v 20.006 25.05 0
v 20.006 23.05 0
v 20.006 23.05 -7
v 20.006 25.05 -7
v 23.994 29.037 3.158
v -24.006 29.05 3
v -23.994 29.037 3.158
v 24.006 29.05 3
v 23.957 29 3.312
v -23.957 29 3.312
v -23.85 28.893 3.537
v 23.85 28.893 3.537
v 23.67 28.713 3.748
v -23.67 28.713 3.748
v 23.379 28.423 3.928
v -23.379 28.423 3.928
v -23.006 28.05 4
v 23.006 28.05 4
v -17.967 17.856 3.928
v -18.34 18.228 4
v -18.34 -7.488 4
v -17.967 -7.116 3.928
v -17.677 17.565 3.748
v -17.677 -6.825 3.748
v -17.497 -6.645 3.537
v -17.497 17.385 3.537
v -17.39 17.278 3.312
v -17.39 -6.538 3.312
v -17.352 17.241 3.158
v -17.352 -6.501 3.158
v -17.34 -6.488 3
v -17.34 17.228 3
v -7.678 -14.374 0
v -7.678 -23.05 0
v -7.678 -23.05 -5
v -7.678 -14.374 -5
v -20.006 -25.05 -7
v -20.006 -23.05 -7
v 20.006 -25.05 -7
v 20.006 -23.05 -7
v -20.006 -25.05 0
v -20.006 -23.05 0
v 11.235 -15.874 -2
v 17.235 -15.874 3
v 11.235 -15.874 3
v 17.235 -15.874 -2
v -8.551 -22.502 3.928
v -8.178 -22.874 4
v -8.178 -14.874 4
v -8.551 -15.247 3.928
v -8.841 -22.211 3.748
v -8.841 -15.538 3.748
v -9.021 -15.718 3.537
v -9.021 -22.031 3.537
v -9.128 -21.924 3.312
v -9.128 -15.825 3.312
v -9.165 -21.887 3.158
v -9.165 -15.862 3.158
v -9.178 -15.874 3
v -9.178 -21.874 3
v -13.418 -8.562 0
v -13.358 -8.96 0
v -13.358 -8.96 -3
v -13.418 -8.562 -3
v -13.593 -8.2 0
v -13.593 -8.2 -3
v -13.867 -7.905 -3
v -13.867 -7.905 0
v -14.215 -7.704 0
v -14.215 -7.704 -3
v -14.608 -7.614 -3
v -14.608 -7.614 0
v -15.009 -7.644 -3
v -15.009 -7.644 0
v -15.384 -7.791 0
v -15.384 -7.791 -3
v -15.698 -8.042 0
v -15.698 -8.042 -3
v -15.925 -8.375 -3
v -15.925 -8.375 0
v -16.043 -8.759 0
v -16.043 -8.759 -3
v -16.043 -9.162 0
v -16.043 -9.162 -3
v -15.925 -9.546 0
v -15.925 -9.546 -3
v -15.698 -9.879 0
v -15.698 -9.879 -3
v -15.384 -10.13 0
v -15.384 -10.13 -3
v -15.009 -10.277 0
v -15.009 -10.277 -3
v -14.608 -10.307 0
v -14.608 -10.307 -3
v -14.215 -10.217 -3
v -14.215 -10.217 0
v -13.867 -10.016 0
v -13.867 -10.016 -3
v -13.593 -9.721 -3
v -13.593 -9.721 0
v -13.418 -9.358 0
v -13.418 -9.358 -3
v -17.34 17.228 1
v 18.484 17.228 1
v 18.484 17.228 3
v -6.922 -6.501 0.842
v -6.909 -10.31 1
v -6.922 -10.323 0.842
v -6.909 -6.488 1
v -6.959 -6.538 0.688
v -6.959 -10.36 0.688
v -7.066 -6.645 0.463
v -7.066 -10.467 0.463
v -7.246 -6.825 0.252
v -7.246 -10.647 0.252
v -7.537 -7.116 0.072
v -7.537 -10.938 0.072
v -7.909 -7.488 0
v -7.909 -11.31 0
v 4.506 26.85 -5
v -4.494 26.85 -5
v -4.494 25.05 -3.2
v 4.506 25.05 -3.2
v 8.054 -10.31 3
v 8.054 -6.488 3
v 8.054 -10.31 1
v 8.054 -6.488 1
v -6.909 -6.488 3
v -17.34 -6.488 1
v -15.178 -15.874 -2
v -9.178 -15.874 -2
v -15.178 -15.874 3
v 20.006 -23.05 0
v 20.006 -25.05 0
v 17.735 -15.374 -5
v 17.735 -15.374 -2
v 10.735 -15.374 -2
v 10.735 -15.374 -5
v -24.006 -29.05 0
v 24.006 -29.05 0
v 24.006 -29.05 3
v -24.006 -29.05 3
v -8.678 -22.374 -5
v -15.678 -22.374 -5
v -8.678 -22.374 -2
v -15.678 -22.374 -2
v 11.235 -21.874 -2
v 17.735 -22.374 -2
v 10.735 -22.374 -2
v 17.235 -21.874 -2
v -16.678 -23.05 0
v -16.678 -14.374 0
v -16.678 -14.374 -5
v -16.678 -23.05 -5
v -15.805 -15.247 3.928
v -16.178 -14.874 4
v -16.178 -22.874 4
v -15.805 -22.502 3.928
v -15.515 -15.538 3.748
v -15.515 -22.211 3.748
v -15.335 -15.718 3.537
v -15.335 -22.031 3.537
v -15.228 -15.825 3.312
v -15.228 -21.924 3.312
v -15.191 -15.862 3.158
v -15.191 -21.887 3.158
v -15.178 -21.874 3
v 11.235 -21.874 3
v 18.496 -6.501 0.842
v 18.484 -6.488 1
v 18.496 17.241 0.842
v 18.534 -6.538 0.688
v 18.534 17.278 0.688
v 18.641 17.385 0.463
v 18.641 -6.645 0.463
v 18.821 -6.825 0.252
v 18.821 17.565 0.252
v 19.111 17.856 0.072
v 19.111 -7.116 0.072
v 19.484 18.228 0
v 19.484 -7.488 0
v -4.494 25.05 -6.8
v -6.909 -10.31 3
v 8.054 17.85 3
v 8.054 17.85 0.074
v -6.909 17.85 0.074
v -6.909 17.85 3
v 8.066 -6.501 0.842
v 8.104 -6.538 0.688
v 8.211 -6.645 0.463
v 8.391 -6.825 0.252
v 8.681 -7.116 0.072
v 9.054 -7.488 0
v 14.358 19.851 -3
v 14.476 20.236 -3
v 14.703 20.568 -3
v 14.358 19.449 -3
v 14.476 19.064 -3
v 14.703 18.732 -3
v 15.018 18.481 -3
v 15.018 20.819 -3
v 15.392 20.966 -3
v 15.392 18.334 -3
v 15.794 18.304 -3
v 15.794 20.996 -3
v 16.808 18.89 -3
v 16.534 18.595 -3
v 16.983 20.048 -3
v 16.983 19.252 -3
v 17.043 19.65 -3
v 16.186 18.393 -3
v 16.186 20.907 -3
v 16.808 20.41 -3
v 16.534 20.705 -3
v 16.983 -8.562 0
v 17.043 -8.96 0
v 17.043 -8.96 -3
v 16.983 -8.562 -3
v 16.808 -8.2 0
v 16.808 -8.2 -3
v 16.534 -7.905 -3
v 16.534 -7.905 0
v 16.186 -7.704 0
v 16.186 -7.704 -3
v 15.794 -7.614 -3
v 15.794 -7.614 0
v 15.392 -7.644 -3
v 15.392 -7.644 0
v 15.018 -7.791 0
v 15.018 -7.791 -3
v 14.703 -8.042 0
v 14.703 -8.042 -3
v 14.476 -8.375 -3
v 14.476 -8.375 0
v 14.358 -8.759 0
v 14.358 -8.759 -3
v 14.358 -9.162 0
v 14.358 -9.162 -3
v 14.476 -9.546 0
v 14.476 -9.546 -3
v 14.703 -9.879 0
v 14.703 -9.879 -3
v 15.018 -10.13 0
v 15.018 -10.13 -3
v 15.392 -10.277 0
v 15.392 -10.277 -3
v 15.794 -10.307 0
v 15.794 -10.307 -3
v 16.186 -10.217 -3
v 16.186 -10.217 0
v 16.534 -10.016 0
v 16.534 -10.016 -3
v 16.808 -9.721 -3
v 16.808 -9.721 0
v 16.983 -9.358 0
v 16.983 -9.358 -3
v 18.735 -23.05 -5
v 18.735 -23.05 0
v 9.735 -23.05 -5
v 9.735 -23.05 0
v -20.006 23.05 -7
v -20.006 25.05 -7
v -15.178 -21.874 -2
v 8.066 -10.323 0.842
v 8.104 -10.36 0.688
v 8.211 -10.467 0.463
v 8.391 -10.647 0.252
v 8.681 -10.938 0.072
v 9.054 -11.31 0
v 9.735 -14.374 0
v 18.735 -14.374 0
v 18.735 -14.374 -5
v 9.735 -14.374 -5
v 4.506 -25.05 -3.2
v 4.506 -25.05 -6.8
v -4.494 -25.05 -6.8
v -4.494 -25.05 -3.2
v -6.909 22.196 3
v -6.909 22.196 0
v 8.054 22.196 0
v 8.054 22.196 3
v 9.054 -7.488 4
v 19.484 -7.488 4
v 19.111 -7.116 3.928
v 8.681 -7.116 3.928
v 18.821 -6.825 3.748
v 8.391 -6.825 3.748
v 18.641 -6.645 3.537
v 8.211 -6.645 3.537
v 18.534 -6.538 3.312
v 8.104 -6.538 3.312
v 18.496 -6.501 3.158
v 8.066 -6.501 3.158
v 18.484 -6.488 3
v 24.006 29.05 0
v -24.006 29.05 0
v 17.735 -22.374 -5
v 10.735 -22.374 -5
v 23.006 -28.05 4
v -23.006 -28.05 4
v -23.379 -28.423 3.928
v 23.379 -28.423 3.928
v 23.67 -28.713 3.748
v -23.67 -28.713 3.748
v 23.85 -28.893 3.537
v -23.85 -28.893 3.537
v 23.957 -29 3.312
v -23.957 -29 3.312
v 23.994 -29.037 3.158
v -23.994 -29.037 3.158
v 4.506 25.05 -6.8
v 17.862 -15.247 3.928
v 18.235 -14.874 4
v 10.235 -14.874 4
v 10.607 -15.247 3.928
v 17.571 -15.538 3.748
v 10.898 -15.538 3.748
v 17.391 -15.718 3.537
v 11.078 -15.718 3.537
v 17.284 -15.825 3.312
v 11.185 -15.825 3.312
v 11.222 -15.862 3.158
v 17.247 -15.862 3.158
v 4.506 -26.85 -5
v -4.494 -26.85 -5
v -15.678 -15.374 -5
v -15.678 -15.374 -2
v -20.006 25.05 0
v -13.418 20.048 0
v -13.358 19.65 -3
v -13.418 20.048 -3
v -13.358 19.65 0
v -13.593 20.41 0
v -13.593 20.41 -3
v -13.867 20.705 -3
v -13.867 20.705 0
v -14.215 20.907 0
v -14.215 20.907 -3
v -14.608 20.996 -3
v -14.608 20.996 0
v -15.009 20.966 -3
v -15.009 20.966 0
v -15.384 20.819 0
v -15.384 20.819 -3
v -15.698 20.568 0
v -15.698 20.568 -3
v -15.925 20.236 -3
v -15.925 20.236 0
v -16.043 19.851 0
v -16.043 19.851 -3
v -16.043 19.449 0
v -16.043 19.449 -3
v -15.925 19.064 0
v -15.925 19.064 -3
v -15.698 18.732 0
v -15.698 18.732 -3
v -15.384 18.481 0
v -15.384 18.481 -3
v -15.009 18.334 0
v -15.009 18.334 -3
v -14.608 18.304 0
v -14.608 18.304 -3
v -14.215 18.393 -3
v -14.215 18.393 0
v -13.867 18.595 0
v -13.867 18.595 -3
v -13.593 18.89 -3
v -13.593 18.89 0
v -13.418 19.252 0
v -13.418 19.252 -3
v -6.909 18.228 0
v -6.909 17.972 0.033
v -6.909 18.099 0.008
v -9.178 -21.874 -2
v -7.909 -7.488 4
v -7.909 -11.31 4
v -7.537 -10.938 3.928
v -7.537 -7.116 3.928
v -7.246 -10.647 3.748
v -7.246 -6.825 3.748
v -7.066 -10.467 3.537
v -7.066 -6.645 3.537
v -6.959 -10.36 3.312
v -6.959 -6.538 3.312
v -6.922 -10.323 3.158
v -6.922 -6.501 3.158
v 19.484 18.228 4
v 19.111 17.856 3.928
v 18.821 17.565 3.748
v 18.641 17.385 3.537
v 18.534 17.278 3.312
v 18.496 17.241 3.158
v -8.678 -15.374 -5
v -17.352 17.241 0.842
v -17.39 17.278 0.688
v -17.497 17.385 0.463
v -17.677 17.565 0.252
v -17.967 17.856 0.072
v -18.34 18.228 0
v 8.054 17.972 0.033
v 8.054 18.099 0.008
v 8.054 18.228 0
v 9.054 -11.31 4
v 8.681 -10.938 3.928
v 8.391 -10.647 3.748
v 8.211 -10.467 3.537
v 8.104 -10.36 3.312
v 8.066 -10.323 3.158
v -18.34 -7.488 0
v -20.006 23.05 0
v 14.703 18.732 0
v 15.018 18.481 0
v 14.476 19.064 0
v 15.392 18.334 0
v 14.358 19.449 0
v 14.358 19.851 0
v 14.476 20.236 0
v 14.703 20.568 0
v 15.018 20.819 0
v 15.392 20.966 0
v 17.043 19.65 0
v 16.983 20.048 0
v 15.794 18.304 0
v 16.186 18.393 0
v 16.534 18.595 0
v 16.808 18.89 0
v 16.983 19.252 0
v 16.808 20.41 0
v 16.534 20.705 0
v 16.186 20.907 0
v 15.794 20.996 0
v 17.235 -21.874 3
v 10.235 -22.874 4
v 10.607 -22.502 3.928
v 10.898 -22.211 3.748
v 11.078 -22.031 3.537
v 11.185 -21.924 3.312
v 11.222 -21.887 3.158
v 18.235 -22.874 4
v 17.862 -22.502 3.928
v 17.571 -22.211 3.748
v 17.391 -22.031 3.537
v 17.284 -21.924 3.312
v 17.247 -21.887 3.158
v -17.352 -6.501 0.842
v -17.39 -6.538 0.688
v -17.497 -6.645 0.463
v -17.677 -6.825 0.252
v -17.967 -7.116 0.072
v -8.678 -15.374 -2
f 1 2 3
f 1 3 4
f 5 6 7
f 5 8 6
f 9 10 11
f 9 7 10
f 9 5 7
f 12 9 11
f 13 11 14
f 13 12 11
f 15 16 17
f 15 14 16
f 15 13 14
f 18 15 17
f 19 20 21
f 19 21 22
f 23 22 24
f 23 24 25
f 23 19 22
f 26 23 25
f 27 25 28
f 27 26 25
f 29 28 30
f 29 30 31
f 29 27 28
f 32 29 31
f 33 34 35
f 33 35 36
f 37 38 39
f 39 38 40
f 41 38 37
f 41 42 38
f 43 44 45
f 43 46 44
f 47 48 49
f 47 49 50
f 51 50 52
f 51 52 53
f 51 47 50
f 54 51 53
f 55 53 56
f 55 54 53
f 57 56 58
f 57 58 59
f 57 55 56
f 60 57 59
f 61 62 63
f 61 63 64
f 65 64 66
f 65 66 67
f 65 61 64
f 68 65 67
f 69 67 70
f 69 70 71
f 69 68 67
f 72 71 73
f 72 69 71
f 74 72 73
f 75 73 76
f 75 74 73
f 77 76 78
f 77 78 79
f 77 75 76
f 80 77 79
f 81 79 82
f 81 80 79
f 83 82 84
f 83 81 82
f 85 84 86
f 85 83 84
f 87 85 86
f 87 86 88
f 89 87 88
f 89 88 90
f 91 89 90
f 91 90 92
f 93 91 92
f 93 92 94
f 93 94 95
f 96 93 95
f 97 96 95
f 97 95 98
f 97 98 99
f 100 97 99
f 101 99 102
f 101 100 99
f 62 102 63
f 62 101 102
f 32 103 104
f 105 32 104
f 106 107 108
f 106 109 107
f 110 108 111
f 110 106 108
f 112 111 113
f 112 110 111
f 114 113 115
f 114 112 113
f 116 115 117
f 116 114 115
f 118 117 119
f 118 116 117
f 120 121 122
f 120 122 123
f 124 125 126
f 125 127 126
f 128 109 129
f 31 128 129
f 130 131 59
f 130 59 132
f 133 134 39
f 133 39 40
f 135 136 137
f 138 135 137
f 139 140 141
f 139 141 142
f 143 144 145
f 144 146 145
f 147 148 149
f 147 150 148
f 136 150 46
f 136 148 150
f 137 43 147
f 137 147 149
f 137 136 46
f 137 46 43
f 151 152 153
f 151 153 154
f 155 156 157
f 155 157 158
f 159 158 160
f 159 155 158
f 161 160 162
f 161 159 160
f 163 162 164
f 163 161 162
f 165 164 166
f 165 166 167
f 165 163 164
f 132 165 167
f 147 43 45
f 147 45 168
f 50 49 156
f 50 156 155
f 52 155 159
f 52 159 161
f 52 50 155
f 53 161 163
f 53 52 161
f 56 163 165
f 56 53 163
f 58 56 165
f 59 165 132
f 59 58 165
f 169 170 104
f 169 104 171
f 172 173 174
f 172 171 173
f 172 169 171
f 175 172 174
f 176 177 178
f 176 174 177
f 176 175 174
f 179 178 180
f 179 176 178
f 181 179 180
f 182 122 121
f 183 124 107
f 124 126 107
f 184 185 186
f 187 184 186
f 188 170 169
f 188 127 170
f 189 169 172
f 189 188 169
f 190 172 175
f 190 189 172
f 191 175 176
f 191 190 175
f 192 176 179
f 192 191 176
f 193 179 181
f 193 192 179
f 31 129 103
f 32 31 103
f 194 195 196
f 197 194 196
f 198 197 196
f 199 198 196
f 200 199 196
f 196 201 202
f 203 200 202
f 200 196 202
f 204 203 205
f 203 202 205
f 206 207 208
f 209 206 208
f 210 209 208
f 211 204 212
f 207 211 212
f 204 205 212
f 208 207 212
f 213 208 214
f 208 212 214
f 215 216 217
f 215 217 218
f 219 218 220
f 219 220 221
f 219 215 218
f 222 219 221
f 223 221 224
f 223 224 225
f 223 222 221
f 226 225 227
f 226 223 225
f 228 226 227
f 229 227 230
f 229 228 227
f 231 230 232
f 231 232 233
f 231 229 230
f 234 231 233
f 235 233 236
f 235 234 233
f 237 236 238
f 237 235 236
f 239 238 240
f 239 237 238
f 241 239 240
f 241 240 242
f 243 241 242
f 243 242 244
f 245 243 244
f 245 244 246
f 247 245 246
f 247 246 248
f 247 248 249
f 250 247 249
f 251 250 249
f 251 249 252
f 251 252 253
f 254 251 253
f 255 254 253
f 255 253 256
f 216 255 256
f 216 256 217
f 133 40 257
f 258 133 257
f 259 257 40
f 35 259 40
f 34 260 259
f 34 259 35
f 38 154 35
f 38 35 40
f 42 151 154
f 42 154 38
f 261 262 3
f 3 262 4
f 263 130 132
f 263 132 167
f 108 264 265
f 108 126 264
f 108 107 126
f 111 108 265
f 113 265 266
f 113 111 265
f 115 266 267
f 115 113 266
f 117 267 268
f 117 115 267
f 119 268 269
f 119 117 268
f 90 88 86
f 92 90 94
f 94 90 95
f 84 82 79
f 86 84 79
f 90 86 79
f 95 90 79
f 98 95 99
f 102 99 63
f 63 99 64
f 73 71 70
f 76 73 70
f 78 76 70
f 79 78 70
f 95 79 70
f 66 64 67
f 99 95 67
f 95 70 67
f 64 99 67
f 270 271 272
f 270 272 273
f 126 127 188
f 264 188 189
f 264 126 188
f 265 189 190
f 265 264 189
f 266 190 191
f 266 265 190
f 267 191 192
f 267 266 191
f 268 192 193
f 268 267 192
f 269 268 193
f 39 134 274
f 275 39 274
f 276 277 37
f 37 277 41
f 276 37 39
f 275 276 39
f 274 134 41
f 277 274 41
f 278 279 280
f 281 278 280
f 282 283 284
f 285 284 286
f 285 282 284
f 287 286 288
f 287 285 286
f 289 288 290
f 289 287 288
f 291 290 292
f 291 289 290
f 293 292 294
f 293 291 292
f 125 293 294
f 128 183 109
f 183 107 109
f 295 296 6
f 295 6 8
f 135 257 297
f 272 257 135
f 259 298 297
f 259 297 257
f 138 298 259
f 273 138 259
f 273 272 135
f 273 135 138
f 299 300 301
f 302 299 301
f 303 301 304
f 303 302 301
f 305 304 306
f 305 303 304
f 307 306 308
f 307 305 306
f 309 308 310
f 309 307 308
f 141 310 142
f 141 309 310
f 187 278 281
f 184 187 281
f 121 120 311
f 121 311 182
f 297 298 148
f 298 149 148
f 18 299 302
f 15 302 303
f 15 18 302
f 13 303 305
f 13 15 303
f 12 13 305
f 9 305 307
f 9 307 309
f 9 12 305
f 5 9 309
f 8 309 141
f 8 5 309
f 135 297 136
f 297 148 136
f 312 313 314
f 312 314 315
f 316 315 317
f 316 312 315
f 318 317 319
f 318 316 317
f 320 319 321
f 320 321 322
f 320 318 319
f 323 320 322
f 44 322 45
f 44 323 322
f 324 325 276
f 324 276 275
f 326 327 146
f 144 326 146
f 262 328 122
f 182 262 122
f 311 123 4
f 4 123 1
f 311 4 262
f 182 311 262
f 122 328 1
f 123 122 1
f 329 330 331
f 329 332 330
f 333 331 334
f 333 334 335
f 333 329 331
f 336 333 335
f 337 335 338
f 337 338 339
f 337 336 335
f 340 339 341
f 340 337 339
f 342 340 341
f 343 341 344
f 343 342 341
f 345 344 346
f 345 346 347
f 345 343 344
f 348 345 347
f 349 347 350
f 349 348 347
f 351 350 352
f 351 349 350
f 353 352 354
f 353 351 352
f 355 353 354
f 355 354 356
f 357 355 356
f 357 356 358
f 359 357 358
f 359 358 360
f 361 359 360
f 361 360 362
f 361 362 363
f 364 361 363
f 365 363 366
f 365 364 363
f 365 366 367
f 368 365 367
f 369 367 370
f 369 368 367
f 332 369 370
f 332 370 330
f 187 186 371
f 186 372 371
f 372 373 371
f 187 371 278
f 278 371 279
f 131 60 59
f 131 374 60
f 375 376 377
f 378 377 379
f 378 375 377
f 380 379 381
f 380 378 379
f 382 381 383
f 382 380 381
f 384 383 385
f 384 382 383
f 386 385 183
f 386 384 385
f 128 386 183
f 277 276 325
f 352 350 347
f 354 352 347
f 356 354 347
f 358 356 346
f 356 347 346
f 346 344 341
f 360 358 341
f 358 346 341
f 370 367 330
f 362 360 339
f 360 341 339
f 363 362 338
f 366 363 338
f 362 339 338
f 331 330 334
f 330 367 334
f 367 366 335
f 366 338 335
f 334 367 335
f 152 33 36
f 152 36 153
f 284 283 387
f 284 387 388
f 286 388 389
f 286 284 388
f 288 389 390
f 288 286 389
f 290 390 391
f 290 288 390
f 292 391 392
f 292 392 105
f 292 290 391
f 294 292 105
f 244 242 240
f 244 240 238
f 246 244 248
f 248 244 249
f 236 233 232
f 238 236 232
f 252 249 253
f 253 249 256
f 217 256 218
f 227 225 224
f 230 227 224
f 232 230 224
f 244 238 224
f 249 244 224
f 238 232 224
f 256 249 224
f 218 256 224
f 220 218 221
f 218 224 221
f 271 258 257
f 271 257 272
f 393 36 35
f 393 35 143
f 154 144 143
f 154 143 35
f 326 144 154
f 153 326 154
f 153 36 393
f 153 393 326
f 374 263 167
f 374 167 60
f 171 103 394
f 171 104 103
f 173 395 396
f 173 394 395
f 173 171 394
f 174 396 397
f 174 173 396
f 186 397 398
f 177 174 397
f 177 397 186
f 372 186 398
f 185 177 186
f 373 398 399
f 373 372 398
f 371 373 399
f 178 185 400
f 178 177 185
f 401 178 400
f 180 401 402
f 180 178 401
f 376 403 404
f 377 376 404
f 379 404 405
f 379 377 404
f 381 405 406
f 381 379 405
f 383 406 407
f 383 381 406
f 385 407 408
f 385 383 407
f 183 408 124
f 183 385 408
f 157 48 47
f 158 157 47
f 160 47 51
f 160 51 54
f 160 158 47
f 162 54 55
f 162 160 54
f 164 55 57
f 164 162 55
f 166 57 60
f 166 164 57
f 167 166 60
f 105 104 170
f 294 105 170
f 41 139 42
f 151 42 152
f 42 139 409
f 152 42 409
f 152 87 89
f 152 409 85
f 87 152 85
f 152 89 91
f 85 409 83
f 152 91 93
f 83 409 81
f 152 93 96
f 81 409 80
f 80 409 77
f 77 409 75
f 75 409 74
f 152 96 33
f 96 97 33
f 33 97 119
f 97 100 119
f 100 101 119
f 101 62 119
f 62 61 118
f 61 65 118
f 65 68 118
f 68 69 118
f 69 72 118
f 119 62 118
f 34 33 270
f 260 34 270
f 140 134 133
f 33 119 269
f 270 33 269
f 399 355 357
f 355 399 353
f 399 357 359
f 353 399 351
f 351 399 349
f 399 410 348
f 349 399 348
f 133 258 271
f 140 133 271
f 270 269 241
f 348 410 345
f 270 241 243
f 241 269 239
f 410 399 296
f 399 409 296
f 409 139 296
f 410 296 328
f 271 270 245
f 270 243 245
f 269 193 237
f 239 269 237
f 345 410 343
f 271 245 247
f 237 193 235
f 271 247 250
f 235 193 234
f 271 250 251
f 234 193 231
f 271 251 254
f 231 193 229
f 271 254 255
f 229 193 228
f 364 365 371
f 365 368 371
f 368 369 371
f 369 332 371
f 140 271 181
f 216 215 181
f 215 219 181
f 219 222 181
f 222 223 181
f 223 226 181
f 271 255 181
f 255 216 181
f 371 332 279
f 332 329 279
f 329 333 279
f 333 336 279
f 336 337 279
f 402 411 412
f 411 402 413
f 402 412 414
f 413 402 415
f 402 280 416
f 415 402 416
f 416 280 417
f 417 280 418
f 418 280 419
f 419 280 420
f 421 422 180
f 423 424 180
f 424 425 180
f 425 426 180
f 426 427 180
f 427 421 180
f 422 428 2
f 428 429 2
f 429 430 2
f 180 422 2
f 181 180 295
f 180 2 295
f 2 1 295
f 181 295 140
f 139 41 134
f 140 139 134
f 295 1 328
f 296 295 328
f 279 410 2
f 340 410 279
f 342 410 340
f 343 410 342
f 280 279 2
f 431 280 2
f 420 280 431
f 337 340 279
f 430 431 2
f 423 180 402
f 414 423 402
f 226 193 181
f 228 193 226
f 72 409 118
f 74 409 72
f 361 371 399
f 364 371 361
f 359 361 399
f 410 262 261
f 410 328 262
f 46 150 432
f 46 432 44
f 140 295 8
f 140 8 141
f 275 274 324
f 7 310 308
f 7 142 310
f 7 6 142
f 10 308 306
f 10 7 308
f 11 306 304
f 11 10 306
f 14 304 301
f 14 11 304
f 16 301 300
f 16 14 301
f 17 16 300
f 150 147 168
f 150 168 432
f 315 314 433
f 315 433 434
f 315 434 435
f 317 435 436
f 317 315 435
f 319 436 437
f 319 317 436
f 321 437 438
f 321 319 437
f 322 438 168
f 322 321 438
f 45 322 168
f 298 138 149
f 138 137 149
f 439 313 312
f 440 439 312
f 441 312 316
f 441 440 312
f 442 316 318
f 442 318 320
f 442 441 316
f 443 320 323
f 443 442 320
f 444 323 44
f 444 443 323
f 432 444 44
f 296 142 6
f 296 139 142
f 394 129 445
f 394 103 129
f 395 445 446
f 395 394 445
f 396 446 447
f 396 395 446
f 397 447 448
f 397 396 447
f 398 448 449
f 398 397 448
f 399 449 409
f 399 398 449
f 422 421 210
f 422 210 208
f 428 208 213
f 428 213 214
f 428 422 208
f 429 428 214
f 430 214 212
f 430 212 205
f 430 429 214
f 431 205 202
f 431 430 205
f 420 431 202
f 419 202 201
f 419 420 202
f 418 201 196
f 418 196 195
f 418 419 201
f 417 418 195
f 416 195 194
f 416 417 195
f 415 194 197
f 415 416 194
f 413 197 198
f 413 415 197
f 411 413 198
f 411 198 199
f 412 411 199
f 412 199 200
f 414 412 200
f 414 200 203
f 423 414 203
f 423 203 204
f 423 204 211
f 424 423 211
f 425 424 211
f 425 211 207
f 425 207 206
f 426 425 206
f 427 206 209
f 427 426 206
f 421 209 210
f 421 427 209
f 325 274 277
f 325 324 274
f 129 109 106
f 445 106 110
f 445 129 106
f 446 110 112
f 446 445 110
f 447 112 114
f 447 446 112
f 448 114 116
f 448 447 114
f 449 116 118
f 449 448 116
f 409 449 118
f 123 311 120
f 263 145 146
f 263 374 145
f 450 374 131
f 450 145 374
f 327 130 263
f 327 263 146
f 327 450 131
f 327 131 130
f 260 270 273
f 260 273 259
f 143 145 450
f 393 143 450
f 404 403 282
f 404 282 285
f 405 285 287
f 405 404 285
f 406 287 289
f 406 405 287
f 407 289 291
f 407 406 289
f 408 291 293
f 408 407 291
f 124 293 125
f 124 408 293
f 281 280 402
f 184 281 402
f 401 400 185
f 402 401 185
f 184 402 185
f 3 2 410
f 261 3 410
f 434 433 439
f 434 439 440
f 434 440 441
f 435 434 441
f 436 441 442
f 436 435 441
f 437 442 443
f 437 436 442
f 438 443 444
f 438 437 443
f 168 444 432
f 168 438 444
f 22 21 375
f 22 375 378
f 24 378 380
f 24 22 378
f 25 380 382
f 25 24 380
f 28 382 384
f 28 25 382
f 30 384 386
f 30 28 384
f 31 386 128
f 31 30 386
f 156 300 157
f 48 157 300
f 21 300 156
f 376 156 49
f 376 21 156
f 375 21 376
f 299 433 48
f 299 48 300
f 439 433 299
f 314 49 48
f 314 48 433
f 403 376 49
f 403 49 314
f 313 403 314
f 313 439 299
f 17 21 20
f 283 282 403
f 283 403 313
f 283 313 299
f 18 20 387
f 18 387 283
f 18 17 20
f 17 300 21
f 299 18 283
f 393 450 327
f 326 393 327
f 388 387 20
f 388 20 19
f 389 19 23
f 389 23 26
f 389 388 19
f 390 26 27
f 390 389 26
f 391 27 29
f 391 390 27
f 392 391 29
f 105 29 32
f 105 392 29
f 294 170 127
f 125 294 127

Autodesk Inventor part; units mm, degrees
ref_plane "YZ Plane" through (0, 0, 0) normal (1, 0, 0) x (0, 1, 0)
ref_plane "XZ Plane" through (0, 0, 0) normal (0, 1, 0) x (-1, 0, 0)
ref_plane "XY Plane" through (0, 0, 0) normal (0, 0, 1) x (1, 0, 0)
sketch "Skizze1" plane through (0, 0, 0) normal (0, 0, 1) x (1, 0, 0)
  line L0 (-24.0065, 29.05) -> (24.0065, 29.05)
  line L1 (24.0065, 29.05) -> (24.0065, -29.05)
  line L2 (24.0065, -29.05) -> (-24.0065, -29.05)
  line L3 (-24.0065, -29.05) -> (-24.0065, 29.05)
  line L4 (-24.0065, 29.05) -> (24.0065, -29.05) construction
  line L5 (24.0065, 29.05) -> (-24.0065, -29.05) construction
  line L6 (-24.0065, 29.05) -> (-20.0065, 29.05)
  line L7 (-20.0065, 29.05) -> (-20.0065, -29.05)
  line L8 (-20.0065, -29.05) -> (-24.0065, -29.05)
  line L9 (-24.0065, -29.05) -> (-24.0065, 29.05)
  line L10 (-20.0065, -29.05) -> (24.0065, -29.05)
  line L11 (24.0065, -29.05) -> (24.0065, -25.05)
  line L12 (24.0065, -25.05) -> (-20.0065, -25.05)
  line L13 (-20.0065, -25.05) -> (-20.0065, -29.05)
  line L14 (24.0065, -25.05) -> (20.0065, -25.05)
  line L15 (20.0065, -25.05) -> (20.0065, 29.05)
  line L16 (20.0065, 29.05) -> (24.0065, 29.05)
  line L17 (24.0065, 29.05) -> (24.0065, -25.05)
  line L18 (20.0065, 29.05) -> (-20.0065, 29.05)
  line L19 (-20.0065, 29.05) -> (-20.0065, 25.05)
  line L20 (-20.0065, 25.05) -> (20.0065, 25.05)
  line L21 (20.0065, 25.05) -> (20.0065, 29.05)
  line L22 (-20.0065, 25.05) -> (20.0065, 25.05)
  line L23 (20.0065, 25.05) -> (20.0065, 23.05)
  line L24 (20.0065, 23.05) -> (-20.0065, 23.05)
  line L25 (-20.0065, 23.05) -> (-20.0065, 25.05)
  line L26 (-20.0065, -25.05) -> (20.0065, -25.05)
  line L27 (20.0065, -25.05) -> (20.0065, -23.05)
  line L28 (20.0065, -23.05) -> (-20.0065, -23.05)
  line L29 (-20.0065, -23.05) -> (-20.0065, -25.05)
  line L30 (-24.0065, 29.05) -> (24.0065, 29.05)
  line L31 (24.0065, 29.05) -> (24.0065, -29.05)
  line L32 (24.0065, -29.05) -> (-24.0065, -29.05)
  line L33 (-24.0065, -29.05) -> (-24.0065, 29.05)
  circle A0 centre (-14.7085, 19.65) radius 1.35
  circle A1 centre (15.6927, 19.65) radius 1.35
  circle A2 centre (-14.7085, -8.9604) radius 1.35
  circle A3 centre (15.6927, -8.9604) radius 1.35
  line L34 (-17.3399, 17.2285) -> (18.4839, 17.2285)
  line L35 (18.4839, 17.2285) -> (18.4839, -6.4884)
  line L36 (18.4839, -6.4884) -> (-17.3399, -6.4884)
  line L37 (-17.3399, -6.4884) -> (-17.3399, 17.2285)
  line L38 (-17.3399, -6.4884) -> (-6.9094, -6.4884)
  line L39 (-6.9094, -10.3104) -> (-6.9094, -6.4884)
  line L40 (18.4839, -6.4884) -> (8.0539, -6.4884)
  line L41 (8.0539, -6.4884) -> (8.0539, -10.3104)
  line L42 (8.0539, -10.3104) -> (-6.9094, -10.3104)
  line L43 (-6.9094, 22.1958) -> (8.0539, 22.1958)
  line L44 (8.0539, 22.1958) -> (8.0539, 17.8498)
  line L45 (8.0539, 17.8498) -> (-6.9094, 17.8498)
  line L46 (-6.9094, 17.8498) -> (-6.9094, 22.1958)
  point P0 (0, 0)
  point P1 (-20.0065, -25.05)
  dimension "d0" = 48.013
  dimension "d1" = 58.1
  dimension "d2" = 4
  dimension "d3" = 4
  dimension "d4" = 4
  dimension "d5" = 4
  dimension "d6" = 2
  dimension "d7" = 2
  dimension "d28" = 2.7
  dimension "d29" = 2.7
  dimension "d30" = 2.7
  dimension "d31" = 2.7
  dimension "d32" = 10.43
  dimension "d33" = 3.822
extrude "Extrusion1" add sketch "Skizze1" against normal blind 7 contours L20 L15 L24 L7 | L7 L28 L15 L12
sketch "Skizze2" plane through (-20.0065, -25.05, 0) normal (0, -1, 0) x (1, 0, 0)
  line L0 (40.013, 0) -> (0, 0) projected
  line L1 (40.013, 0) -> (20.013, 0)
  line L2 (20.013, 0) -> (20.013, -5)
  line L3 (15.513, -3.2) -> (24.513, -3.2)
  line L4 (24.513, -3.2) -> (24.513, -6.8)
  line L5 (24.513, -6.8) -> (15.513, -6.8)
  line L6 (15.513, -6.8) -> (15.513, -3.2)
  line L7 (15.513, -3.2) -> (24.513, -6.8) construction
  line L8 (24.513, -3.2) -> (15.513, -6.8) construction
  line L9 (20.013, -5) -> (15.513, -5)
  line L10 (20.013, -5) -> (24.513, -5)
  point P0 (20.0065, 0)
  dimension "d10" = 20
  dimension "d11" = 5
  dimension "d12" = 9
  dimension "d13" = 3.6
extrude "Extrusion2" add sketch "Skizze2" along normal blind 1.8
chamfer "Fasen1" distance 1.8 angle 45 2 edges at (0.0065, -26.85, -3.2) (0.0065, -26.85, -6.8)
sketch "Skizze3" plane through (-20.0065, 25.05, 0) normal (0, 1, 0) x (1, 0, 0)
  line L0 (40.013, 0) -> (40.013, 7) projected
  line L1 (40.013, 0) -> (20.013, 0)
  line L2 (0, 0) -> (40.013, 0) projected
  line L3 (20.013, 0) -> (20.013, 5)
  line L4 (24.513, 3.2) -> (15.513, 3.2)
  line L5 (15.513, 3.2) -> (15.513, 6.8)
  line L6 (15.513, 6.8) -> (24.513, 6.8)
  line L7 (24.513, 6.8) -> (24.513, 3.2)
  line L8 (24.513, 3.2) -> (15.513, 6.8) construction
  line L9 (15.513, 3.2) -> (24.513, 6.8) construction
  line L10 (20.013, 5) -> (24.513, 5)
  line L11 (24.513, 5) -> (15.513, 5)
  line L12 (15.513, 5) -> (15.513, 6.8)
  line L13 (15.513, 6.8) -> (24.513, 6.8)
  line L14 (24.513, 6.8) -> (24.513, 5)
  point P0 (20.0065, 0)
  dimension "d19" = 20
  dimension "d20" = 5
  dimension "d21" = 9
  dimension "d22" = 3.6
extrude "Extrusion3" add sketch "Skizze3" along normal blind 1.8
chamfer "Fasen2" distance 1.8 angle 45 2 edges at (0.0065, 26.85, -3.2) (0.0065, 26.85, -6.8)
extrude "Extrusion4" add sketch "Skizze1" along normal blind 4 contours L0 L7 L2 L3 | L0 L15 L20 L7 | L0 L1 L12 L15 | L20 L15 L24 L7 | L7 L12 L1 L2 | L24 L15 L28 L7 | L7 L28 L15 L12 | A0 | A1 | A2 | A3 | L34 L35 L36 L37 | L36 L41 L42 L39 | L43 L44 L45 L46
extrude "Extrusion5" add sketch "Skizze1" against normal blind 3 contours A0 | A1 | A2 | A3
extrude "Extrusion6" cut sketch "Skizze1" along normal blind 4 contours L34 L35 L36 L37 | L36 L41 L42 L39
fillet "Rundung1" radius 1 16 edges at (0.572, 17.2285, 4) (-17.3399, 5.3701, 4) (-12.1246, -6.4884, 4) (-6.9094, -8.3994, 4) (0.5723, -10.3104, 4) (8.0539, -8.3994, 4) (13.2689, -6.4884, 4) (18.4839, 5.3701, 4) (8.0539, -8.3994, 0) (13.2689, -6.4884, 0) (18.4839, 5.3701, 0) (0.5723, -10.3104, 0) (-12.1246, -6.4884, 0) (-6.9094, -8.3994, 0) (-17.3399, 5.3701, 0) (0.572, 17.2285, 0)
extrude "Extrusion7" cut sketch "Skizze1" along normal blind 3 contours L43 L44 L45 L46
sketch "Skizze4" plane through (0, 0, 0) normal (0, 0, -1) x (-1, 0, 0)
  line L0 (-17.7346, -15.3743) -> (-10.7346, -15.3743)
  line L1 (-10.7346, -15.3743) -> (-10.7346, -22.3743)
  line L2 (-10.7346, -22.3743) -> (-17.7346, -22.3743)
  line L3 (-17.7346, -22.3743) -> (-17.7346, -15.3743)
  line L4 (-17.7346, -15.3743) -> (-10.7346, -22.3743) construction
  line L5 (-10.7346, -15.3743) -> (-17.7346, -22.3743) construction
  line L6 (-18.7346, -14.3743) -> (-9.7346, -14.3743)
  line L7 (-9.7346, -14.3743) -> (-9.7346, -23.3743)
  line L8 (-9.7346, -23.3743) -> (-18.7346, -23.3743)
  line L9 (-18.7346, -23.3743) -> (-18.7346, -14.3743)
  line L10 (-18.7346, -14.3743) -> (-9.7346, -23.3743) construction
  line L11 (-9.7346, -14.3743) -> (-18.7346, -23.3743) construction
  line L12 (-17.2346, -15.8743) -> (-11.2346, -15.8743)
  line L13 (-11.2346, -15.8743) -> (-11.2346, -21.8743)
  line L14 (-11.2346, -21.8743) -> (-17.2346, -21.8743)
  line L15 (-17.2346, -21.8743) -> (-17.2346, -15.8743)
  line L16 (-17.2346, -15.8743) -> (-11.2346, -21.8743) construction
  line L17 (-11.2346, -15.8743) -> (-17.2346, -21.8743) construction
  line L18 (9.178, -15.8743) -> (15.178, -15.8743)
  line L19 (15.178, -15.8743) -> (15.178, -21.8743)
  line L20 (15.178, -21.8743) -> (9.178, -21.8743)
  line L21 (9.178, -21.8743) -> (9.178, -15.8743)
  line L22 (9.178, -15.8743) -> (15.178, -21.8743) construction
  line L23 (15.178, -15.8743) -> (9.178, -21.8743) construction
  line L24 (8.678, -15.3743) -> (15.678, -15.3743)
  line L25 (15.678, -15.3743) -> (15.678, -22.3743)
  line L26 (15.678, -22.3743) -> (8.678, -22.3743)
  line L27 (8.678, -22.3743) -> (8.678, -15.3743)
  line L28 (8.678, -15.3743) -> (15.678, -22.3743) construction
  line L29 (15.678, -15.3743) -> (8.678, -22.3743) construction
  line L30 (7.678, -14.3743) -> (16.678, -14.3743)
  line L31 (16.678, -14.3743) -> (16.678, -23.3743)
  line L32 (16.678, -23.3743) -> (7.678, -23.3743)
  line L33 (7.678, -23.3743) -> (7.678, -14.3743)
  line L34 (7.678, -14.3743) -> (16.678, -23.3743) construction
  line L35 (16.678, -14.3743) -> (7.678, -23.3743) construction
  point P0 (0, 0)
  point P1 (-14.2346, -18.8743)
  point P2 (-14.2346, -18.8743)
  point P3 (-14.2346, -18.8743)
  point P4 (12.178, -18.8743)
  point P5 (12.178, -18.8743)
  point P6 (12.178, -18.8743)
  dimension "d43" = 7
  dimension "d44" = 7
  dimension "d45" = 9
  dimension "d46" = 9
  dimension "d47" = 6
  dimension "d48" = 6
  dimension "d49" = 6
  dimension "d50" = 6
  dimension "d51" = 7
  dimension "d52" = 7
  dimension "d53" = 9
  dimension "d54" = 9
extrude "Extrusion8" add sketch "Skizze4" along normal blind 5 contours L6 L7 L8 L9 | L30 L31 L32 L33
extrude "Extrusion9" add sketch "Skizze4" along normal blind 2 contours L0 L1 L2 L3 | L24 L25 L26 L27
extrude "Extrusion10" cut sketch "Skizze4" against normal blind 5 contours L12 L13 L14 L15 | L18 L19 L20 L21
fillet "Rundung2" radius 1 12 edges at (-12.178, -15.8743, 4) (-9.178, -18.8743, 4) (-12.178, -21.8743, 4) (-15.178, -18.8743, 4) (11.2346, -18.8743, 4) (14.2346, -15.8743, 4) (17.2346, -18.8743, 4) (14.2346, -21.8743, 4) (-24.0065, 0, 4) (0, -29.05, 4) (24.0065, 0, 4) (0, 29.05, 4)
properties part number "Deckel"
